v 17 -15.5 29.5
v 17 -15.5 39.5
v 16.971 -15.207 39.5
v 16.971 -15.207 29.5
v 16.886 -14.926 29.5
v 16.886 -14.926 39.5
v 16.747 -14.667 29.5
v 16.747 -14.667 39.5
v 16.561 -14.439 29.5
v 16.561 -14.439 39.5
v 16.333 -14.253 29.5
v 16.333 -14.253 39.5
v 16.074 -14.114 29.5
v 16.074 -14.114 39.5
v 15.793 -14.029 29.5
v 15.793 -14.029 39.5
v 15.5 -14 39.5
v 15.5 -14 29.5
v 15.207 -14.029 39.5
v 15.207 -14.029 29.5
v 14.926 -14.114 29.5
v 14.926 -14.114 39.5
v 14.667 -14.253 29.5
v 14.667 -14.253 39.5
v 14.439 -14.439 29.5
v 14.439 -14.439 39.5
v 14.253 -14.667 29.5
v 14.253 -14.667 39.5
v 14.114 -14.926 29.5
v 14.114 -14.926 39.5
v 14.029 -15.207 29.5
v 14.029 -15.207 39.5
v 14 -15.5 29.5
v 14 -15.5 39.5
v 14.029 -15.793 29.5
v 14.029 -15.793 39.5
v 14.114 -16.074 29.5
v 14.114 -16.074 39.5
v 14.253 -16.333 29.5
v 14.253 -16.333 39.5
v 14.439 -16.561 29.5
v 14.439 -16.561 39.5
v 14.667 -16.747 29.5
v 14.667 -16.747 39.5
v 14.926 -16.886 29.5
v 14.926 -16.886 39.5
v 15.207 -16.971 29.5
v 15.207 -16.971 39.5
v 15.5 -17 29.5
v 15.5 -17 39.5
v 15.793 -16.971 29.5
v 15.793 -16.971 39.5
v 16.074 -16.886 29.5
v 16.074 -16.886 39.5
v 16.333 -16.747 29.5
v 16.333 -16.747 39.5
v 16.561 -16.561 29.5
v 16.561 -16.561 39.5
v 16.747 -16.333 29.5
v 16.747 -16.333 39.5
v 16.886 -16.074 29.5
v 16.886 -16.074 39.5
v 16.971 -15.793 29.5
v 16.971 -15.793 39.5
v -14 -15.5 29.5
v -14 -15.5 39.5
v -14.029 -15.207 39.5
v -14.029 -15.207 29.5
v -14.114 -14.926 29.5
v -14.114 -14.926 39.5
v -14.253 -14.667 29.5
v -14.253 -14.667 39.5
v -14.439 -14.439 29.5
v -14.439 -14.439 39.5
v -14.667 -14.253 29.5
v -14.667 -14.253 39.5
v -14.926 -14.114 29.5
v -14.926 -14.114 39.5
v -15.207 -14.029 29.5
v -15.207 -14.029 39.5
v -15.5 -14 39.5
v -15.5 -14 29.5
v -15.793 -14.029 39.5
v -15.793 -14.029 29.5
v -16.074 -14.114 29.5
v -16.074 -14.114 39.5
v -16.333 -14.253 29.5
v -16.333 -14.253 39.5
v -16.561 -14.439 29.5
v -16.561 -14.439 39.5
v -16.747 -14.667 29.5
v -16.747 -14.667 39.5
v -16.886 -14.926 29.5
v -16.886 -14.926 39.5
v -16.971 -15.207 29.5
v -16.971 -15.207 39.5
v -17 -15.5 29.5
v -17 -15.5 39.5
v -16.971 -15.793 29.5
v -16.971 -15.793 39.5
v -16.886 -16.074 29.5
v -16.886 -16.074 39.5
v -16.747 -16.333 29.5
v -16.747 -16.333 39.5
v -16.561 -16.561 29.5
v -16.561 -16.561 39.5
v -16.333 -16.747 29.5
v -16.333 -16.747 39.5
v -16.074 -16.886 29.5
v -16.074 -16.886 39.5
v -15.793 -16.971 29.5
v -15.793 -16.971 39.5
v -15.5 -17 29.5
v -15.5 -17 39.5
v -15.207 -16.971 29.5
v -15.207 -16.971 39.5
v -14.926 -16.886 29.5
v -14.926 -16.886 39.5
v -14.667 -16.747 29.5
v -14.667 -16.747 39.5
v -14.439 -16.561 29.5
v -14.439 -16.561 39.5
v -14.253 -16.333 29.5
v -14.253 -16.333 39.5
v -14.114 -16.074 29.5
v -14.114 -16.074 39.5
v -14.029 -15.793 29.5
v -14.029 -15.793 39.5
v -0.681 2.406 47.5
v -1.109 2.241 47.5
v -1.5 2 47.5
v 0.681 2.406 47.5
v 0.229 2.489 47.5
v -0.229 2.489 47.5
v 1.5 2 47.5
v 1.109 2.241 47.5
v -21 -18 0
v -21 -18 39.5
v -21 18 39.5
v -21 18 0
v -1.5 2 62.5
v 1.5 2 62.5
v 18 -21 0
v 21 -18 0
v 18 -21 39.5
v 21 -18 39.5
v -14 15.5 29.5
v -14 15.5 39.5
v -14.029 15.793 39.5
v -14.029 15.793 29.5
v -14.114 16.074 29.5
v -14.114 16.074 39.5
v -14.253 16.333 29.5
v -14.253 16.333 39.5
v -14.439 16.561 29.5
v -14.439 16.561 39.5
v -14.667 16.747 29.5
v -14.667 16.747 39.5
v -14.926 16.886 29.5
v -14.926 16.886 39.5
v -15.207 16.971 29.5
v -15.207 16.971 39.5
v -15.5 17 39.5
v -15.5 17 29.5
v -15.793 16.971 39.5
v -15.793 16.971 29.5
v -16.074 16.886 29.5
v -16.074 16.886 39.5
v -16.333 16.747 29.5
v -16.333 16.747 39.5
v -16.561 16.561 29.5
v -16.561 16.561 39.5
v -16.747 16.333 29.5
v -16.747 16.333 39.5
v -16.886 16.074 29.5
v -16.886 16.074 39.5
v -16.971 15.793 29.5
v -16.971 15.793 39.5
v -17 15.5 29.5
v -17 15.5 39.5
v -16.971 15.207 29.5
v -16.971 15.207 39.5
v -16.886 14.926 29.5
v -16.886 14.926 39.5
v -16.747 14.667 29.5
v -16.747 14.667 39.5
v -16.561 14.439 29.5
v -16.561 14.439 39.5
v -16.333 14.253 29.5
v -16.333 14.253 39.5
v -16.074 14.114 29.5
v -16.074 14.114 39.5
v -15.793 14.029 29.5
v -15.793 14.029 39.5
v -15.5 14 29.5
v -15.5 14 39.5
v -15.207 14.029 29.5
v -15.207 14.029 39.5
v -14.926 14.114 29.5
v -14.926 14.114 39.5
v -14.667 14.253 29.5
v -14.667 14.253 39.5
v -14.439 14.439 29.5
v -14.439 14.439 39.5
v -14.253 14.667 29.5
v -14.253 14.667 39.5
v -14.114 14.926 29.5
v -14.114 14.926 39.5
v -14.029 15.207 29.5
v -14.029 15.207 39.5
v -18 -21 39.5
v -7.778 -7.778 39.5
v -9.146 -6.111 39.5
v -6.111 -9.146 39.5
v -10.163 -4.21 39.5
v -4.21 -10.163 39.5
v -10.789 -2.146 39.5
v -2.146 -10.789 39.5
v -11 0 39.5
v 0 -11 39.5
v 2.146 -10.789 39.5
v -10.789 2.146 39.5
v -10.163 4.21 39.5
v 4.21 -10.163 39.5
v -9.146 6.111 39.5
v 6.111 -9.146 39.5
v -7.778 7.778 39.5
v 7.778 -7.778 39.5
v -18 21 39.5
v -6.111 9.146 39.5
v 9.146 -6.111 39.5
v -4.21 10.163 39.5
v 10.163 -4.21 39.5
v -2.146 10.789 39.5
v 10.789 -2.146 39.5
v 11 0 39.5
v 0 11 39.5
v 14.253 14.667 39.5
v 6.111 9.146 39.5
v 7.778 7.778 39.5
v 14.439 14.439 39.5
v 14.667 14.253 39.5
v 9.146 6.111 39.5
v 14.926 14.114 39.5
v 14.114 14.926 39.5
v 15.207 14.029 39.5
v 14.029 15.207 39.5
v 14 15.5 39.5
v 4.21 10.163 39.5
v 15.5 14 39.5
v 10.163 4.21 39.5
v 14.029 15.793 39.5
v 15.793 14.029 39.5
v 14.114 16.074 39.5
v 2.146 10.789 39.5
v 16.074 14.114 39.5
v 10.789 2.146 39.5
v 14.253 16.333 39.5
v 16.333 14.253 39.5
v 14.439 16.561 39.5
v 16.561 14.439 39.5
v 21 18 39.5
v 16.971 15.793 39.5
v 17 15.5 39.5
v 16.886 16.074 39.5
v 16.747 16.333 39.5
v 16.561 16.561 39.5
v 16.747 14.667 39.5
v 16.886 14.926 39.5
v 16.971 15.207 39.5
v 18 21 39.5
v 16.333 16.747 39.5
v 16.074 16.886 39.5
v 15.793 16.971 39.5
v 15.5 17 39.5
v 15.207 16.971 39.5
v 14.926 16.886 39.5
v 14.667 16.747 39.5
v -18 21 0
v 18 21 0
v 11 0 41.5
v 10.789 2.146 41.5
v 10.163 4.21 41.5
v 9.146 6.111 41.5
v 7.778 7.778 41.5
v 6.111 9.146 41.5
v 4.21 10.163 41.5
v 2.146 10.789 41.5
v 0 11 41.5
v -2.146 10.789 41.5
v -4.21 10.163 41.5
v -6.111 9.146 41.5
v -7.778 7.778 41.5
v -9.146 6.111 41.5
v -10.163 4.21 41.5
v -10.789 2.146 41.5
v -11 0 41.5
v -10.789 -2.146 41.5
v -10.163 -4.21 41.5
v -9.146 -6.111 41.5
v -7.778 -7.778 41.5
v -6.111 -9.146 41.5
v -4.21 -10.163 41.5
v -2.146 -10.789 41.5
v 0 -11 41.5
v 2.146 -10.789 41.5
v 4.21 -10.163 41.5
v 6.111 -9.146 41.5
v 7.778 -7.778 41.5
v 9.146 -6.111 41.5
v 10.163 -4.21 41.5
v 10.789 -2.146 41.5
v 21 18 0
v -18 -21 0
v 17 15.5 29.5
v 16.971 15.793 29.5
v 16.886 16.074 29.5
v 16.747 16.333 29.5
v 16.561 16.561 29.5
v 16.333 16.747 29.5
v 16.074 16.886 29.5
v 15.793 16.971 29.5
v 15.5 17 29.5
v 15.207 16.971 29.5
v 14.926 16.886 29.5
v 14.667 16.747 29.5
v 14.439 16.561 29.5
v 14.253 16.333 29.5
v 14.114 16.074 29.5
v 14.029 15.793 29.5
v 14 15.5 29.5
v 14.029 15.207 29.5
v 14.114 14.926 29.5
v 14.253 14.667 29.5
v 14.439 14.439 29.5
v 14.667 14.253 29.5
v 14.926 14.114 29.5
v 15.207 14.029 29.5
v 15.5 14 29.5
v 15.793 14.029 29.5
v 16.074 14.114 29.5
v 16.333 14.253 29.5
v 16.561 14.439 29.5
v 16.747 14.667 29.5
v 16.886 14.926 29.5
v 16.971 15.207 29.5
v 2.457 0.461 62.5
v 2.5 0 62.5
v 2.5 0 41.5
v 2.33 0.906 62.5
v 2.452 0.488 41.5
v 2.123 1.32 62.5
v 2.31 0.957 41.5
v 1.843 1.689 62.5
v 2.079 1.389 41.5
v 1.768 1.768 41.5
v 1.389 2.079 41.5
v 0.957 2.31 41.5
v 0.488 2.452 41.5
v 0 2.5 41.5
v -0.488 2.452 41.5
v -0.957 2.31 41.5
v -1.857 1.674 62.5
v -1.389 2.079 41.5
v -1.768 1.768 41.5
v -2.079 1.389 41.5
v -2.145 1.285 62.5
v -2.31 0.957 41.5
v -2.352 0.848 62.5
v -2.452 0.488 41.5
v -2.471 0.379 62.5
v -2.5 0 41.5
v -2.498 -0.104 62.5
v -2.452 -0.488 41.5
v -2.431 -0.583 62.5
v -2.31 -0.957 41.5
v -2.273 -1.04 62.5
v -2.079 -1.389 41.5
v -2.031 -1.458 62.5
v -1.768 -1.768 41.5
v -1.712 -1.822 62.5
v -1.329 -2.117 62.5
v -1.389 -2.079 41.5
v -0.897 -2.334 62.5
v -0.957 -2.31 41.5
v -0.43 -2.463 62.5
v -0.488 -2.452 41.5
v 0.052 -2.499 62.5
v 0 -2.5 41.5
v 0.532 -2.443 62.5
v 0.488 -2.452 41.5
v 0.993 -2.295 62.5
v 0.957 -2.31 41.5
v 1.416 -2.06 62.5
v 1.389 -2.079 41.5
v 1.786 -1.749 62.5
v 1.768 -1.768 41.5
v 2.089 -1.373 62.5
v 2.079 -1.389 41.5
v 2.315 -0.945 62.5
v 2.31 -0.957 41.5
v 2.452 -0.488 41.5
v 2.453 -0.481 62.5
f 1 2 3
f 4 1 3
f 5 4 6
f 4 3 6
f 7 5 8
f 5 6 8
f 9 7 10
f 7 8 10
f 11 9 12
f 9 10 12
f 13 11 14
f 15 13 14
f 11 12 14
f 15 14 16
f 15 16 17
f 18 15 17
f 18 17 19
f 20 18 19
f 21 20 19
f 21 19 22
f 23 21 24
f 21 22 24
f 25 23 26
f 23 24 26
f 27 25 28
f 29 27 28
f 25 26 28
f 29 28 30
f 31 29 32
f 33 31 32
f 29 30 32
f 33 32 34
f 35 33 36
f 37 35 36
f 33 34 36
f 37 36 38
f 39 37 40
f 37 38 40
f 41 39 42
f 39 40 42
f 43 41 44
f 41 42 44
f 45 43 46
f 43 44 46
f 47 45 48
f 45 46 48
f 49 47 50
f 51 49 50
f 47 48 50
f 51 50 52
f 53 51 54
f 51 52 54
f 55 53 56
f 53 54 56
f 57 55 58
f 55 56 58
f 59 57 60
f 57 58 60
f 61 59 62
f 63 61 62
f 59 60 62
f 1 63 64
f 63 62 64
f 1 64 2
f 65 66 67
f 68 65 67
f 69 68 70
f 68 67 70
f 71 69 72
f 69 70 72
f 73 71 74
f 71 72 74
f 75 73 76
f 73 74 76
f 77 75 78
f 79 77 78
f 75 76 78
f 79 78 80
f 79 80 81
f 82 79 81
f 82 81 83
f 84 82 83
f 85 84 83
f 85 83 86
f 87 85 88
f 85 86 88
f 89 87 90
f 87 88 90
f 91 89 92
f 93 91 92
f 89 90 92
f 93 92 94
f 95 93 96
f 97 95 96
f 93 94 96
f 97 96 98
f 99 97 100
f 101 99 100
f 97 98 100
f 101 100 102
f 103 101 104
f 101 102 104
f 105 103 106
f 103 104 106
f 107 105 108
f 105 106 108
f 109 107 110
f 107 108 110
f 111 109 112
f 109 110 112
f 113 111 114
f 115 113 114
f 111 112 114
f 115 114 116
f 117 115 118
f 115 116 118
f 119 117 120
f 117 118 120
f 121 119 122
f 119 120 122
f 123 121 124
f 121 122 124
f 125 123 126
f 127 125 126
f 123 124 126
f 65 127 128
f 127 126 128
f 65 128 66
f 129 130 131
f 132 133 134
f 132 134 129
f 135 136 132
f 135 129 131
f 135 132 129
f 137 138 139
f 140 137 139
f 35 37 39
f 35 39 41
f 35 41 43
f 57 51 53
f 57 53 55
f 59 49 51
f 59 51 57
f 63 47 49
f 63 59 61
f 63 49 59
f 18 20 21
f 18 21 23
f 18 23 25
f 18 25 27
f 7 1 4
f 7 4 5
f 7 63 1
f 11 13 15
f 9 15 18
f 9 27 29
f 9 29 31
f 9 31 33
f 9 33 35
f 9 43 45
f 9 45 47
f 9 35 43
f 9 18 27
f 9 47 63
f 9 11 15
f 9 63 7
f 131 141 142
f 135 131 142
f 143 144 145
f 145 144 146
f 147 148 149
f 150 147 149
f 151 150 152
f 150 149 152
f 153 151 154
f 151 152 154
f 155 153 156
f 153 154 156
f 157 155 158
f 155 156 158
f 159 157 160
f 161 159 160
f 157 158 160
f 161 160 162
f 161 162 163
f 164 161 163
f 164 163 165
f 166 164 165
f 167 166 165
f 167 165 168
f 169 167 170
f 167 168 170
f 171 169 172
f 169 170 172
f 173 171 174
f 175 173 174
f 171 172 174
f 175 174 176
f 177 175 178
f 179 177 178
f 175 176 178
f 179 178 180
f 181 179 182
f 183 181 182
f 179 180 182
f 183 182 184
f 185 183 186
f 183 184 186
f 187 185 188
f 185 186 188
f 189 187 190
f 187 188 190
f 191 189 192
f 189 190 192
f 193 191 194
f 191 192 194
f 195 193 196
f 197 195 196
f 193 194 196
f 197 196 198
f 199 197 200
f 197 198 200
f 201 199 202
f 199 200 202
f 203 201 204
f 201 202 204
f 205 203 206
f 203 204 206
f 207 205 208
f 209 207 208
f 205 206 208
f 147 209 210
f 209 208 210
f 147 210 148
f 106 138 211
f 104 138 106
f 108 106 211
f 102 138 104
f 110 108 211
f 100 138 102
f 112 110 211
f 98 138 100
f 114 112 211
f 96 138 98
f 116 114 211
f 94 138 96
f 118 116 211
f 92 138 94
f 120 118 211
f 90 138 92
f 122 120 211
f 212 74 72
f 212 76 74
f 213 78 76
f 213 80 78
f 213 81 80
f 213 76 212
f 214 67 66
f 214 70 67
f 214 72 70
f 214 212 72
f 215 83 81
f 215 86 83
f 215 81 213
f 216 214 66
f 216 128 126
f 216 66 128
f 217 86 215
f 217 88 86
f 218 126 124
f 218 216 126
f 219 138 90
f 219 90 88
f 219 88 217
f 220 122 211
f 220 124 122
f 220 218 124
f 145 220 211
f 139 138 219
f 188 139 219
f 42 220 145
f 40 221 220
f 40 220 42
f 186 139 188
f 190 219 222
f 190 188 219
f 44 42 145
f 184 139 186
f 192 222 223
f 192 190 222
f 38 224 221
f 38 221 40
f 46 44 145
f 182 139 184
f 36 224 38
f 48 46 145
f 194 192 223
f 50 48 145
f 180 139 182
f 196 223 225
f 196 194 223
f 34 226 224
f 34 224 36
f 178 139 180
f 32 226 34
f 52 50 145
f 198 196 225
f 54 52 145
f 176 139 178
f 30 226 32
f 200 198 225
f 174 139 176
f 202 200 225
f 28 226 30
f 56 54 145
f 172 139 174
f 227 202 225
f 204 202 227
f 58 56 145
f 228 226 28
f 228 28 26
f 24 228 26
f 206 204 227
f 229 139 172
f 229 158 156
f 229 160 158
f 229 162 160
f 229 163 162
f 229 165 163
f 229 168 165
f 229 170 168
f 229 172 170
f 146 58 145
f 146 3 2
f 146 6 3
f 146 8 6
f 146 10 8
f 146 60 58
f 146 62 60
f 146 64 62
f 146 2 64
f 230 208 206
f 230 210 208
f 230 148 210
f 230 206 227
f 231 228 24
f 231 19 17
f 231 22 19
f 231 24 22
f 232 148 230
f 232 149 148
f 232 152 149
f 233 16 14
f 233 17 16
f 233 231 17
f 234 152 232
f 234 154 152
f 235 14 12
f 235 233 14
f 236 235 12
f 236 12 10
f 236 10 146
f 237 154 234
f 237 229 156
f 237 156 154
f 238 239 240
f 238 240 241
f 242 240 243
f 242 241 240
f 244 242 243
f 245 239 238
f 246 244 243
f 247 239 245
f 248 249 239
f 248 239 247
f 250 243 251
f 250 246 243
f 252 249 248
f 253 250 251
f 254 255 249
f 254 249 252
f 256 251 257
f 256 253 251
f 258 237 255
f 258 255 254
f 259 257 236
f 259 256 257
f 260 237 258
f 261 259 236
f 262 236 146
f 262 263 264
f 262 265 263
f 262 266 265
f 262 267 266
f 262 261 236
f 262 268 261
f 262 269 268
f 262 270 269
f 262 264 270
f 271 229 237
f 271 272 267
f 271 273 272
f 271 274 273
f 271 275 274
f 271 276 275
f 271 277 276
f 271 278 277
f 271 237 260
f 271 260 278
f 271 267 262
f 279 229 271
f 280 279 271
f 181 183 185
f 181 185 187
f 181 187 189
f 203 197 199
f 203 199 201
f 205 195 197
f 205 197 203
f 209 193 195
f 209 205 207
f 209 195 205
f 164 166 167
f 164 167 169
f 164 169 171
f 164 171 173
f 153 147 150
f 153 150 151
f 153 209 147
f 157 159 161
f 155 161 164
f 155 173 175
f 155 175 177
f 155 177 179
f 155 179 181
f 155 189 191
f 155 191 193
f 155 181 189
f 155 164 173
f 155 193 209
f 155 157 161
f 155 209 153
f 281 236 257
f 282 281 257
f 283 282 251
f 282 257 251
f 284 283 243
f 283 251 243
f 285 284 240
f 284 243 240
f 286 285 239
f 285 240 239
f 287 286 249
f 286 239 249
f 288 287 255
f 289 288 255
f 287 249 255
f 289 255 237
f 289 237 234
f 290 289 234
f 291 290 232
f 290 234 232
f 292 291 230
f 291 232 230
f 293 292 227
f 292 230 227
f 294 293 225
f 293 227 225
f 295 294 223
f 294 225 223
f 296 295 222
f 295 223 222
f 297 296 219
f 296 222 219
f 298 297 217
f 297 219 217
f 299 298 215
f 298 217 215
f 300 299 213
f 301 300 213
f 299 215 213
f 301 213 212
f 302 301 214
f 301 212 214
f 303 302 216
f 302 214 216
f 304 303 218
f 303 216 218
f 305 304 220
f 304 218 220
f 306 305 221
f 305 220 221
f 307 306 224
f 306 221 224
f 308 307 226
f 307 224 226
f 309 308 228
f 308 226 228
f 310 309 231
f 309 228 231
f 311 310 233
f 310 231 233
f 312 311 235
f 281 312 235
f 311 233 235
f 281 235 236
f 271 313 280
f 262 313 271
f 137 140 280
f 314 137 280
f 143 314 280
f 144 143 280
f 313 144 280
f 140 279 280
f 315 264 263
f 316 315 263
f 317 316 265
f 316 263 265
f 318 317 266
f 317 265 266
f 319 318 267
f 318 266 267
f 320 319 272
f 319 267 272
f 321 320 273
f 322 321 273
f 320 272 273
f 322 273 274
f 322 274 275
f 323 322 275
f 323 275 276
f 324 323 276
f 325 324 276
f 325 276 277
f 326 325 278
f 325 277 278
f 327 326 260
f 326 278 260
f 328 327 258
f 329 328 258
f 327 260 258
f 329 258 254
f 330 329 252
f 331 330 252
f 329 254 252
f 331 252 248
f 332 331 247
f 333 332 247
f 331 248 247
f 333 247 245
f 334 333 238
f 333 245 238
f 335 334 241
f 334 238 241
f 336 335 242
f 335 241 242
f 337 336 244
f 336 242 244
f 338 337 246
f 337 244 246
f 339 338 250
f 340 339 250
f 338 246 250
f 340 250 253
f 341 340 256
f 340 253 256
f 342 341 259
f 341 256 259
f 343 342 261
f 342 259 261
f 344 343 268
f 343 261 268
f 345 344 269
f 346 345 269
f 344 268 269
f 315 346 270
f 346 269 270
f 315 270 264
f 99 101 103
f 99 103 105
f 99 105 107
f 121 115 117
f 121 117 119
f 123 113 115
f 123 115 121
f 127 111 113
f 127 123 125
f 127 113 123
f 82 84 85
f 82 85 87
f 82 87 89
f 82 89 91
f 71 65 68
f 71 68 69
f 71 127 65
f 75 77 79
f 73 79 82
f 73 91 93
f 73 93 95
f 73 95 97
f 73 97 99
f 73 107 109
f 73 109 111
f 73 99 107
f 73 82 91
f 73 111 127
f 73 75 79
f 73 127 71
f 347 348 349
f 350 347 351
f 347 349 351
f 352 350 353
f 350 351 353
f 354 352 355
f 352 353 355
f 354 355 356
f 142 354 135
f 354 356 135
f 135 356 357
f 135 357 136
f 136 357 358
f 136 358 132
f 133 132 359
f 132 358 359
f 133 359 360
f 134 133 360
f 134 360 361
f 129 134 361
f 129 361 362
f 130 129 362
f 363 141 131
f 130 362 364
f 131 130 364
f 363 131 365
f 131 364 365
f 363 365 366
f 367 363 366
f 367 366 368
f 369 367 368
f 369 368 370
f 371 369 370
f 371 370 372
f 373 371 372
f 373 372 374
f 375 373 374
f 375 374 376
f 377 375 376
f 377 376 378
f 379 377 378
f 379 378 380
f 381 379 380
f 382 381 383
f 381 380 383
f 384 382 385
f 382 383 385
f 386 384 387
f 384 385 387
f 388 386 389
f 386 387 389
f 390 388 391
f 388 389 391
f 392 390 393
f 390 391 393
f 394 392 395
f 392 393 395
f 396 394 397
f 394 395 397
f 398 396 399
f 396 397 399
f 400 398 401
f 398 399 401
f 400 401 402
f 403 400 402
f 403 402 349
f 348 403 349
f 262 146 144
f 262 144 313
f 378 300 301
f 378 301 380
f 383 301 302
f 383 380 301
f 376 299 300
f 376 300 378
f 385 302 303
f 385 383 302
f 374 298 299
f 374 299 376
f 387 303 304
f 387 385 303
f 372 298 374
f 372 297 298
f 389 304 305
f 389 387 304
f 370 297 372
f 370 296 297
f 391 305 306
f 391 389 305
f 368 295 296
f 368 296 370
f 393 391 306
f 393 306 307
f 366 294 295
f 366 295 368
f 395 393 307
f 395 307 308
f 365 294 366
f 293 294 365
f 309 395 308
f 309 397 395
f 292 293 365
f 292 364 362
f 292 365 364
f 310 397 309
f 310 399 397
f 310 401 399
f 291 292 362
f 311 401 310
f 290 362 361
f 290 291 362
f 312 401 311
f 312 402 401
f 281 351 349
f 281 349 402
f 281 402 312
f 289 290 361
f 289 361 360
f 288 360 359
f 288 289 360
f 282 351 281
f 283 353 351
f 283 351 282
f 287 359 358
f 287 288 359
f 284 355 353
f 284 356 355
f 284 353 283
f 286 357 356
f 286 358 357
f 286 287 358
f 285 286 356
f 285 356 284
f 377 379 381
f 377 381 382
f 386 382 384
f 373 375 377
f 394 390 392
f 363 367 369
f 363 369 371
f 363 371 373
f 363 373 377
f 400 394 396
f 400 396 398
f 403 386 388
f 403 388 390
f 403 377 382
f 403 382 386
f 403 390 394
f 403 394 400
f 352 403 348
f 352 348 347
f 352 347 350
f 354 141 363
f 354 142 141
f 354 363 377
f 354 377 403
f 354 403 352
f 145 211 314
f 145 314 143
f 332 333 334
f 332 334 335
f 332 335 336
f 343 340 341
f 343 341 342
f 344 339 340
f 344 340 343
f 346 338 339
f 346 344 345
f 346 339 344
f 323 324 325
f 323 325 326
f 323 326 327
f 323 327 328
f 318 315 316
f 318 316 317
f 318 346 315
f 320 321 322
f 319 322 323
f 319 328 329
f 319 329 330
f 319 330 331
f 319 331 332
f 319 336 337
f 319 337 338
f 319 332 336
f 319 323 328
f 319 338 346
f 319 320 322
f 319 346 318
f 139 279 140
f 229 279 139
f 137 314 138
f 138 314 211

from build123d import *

# Parameters (mm, degrees)
F0_W     = 42
F0_H     = 42
F1_DEPTH = 39.5
F2_R     = 1.5
F3_DEPTH = 10
F2_R_2   = 11
F4_DEPTH = 2
F5_R     = 2.5
F6_DEPTH = 21
F8_DEPTH = 15
F9_SIZE  = 3


with BuildPart() as f1:
    # F0 (on Top) → F1 (new body)
    with BuildSketch(Plane.XY):
        Rectangle(F0_W, F0_H)
    extrude(amount=F1_DEPTH)

    # F2 (on face) → F3 (cut)
    with BuildSketch(Plane.XY.offset(39.5)):
        with Locations((-15.5, -15.5)):
            Circle(F2_R)
        with Locations((-15.5, 15.5)):
            Circle(F2_R)
        with Locations((15.5, 15.5)):
            Circle(F2_R)
        with Locations((15.5, -15.5)):
            Circle(F2_R)
    extrude(amount=-F3_DEPTH, mode=Mode.SUBTRACT)

    # F2 (on face) → F4 (join)
    with BuildSketch(Plane.XY.offset(39.5)):
        Circle(F2_R_2)
    extrude(amount=F4_DEPTH)

    # F5 (on face) → F6 (join)
    with BuildSketch(Plane.XY.offset(41.5)):
        Circle(F5_R)
    extrude(amount=F6_DEPTH)

    # F7 (on face) → F8 (cut)
    with BuildSketch(Plane.XY.offset(62.5)):
        with BuildLine():
            ThreePointArc((1.5, 2), (0, 2.5), (-1.5, 2))
            Line((-1.5, 2), (1.5, 2))
        make_face()
    extrude(amount=-F8_DEPTH, mode=Mode.SUBTRACT)

    # F9
    f9_edges = [f1.edges().sort_by_distance(p)[0] for p in [
        (21, -21, 19.75),
        (21, 21, 19.75),
        (-21, -21, 19.75),
        (-21, 21, 19.75),
    ]]
    chamfer(f9_edges, length=F9_SIZE)


solid = f1.part
